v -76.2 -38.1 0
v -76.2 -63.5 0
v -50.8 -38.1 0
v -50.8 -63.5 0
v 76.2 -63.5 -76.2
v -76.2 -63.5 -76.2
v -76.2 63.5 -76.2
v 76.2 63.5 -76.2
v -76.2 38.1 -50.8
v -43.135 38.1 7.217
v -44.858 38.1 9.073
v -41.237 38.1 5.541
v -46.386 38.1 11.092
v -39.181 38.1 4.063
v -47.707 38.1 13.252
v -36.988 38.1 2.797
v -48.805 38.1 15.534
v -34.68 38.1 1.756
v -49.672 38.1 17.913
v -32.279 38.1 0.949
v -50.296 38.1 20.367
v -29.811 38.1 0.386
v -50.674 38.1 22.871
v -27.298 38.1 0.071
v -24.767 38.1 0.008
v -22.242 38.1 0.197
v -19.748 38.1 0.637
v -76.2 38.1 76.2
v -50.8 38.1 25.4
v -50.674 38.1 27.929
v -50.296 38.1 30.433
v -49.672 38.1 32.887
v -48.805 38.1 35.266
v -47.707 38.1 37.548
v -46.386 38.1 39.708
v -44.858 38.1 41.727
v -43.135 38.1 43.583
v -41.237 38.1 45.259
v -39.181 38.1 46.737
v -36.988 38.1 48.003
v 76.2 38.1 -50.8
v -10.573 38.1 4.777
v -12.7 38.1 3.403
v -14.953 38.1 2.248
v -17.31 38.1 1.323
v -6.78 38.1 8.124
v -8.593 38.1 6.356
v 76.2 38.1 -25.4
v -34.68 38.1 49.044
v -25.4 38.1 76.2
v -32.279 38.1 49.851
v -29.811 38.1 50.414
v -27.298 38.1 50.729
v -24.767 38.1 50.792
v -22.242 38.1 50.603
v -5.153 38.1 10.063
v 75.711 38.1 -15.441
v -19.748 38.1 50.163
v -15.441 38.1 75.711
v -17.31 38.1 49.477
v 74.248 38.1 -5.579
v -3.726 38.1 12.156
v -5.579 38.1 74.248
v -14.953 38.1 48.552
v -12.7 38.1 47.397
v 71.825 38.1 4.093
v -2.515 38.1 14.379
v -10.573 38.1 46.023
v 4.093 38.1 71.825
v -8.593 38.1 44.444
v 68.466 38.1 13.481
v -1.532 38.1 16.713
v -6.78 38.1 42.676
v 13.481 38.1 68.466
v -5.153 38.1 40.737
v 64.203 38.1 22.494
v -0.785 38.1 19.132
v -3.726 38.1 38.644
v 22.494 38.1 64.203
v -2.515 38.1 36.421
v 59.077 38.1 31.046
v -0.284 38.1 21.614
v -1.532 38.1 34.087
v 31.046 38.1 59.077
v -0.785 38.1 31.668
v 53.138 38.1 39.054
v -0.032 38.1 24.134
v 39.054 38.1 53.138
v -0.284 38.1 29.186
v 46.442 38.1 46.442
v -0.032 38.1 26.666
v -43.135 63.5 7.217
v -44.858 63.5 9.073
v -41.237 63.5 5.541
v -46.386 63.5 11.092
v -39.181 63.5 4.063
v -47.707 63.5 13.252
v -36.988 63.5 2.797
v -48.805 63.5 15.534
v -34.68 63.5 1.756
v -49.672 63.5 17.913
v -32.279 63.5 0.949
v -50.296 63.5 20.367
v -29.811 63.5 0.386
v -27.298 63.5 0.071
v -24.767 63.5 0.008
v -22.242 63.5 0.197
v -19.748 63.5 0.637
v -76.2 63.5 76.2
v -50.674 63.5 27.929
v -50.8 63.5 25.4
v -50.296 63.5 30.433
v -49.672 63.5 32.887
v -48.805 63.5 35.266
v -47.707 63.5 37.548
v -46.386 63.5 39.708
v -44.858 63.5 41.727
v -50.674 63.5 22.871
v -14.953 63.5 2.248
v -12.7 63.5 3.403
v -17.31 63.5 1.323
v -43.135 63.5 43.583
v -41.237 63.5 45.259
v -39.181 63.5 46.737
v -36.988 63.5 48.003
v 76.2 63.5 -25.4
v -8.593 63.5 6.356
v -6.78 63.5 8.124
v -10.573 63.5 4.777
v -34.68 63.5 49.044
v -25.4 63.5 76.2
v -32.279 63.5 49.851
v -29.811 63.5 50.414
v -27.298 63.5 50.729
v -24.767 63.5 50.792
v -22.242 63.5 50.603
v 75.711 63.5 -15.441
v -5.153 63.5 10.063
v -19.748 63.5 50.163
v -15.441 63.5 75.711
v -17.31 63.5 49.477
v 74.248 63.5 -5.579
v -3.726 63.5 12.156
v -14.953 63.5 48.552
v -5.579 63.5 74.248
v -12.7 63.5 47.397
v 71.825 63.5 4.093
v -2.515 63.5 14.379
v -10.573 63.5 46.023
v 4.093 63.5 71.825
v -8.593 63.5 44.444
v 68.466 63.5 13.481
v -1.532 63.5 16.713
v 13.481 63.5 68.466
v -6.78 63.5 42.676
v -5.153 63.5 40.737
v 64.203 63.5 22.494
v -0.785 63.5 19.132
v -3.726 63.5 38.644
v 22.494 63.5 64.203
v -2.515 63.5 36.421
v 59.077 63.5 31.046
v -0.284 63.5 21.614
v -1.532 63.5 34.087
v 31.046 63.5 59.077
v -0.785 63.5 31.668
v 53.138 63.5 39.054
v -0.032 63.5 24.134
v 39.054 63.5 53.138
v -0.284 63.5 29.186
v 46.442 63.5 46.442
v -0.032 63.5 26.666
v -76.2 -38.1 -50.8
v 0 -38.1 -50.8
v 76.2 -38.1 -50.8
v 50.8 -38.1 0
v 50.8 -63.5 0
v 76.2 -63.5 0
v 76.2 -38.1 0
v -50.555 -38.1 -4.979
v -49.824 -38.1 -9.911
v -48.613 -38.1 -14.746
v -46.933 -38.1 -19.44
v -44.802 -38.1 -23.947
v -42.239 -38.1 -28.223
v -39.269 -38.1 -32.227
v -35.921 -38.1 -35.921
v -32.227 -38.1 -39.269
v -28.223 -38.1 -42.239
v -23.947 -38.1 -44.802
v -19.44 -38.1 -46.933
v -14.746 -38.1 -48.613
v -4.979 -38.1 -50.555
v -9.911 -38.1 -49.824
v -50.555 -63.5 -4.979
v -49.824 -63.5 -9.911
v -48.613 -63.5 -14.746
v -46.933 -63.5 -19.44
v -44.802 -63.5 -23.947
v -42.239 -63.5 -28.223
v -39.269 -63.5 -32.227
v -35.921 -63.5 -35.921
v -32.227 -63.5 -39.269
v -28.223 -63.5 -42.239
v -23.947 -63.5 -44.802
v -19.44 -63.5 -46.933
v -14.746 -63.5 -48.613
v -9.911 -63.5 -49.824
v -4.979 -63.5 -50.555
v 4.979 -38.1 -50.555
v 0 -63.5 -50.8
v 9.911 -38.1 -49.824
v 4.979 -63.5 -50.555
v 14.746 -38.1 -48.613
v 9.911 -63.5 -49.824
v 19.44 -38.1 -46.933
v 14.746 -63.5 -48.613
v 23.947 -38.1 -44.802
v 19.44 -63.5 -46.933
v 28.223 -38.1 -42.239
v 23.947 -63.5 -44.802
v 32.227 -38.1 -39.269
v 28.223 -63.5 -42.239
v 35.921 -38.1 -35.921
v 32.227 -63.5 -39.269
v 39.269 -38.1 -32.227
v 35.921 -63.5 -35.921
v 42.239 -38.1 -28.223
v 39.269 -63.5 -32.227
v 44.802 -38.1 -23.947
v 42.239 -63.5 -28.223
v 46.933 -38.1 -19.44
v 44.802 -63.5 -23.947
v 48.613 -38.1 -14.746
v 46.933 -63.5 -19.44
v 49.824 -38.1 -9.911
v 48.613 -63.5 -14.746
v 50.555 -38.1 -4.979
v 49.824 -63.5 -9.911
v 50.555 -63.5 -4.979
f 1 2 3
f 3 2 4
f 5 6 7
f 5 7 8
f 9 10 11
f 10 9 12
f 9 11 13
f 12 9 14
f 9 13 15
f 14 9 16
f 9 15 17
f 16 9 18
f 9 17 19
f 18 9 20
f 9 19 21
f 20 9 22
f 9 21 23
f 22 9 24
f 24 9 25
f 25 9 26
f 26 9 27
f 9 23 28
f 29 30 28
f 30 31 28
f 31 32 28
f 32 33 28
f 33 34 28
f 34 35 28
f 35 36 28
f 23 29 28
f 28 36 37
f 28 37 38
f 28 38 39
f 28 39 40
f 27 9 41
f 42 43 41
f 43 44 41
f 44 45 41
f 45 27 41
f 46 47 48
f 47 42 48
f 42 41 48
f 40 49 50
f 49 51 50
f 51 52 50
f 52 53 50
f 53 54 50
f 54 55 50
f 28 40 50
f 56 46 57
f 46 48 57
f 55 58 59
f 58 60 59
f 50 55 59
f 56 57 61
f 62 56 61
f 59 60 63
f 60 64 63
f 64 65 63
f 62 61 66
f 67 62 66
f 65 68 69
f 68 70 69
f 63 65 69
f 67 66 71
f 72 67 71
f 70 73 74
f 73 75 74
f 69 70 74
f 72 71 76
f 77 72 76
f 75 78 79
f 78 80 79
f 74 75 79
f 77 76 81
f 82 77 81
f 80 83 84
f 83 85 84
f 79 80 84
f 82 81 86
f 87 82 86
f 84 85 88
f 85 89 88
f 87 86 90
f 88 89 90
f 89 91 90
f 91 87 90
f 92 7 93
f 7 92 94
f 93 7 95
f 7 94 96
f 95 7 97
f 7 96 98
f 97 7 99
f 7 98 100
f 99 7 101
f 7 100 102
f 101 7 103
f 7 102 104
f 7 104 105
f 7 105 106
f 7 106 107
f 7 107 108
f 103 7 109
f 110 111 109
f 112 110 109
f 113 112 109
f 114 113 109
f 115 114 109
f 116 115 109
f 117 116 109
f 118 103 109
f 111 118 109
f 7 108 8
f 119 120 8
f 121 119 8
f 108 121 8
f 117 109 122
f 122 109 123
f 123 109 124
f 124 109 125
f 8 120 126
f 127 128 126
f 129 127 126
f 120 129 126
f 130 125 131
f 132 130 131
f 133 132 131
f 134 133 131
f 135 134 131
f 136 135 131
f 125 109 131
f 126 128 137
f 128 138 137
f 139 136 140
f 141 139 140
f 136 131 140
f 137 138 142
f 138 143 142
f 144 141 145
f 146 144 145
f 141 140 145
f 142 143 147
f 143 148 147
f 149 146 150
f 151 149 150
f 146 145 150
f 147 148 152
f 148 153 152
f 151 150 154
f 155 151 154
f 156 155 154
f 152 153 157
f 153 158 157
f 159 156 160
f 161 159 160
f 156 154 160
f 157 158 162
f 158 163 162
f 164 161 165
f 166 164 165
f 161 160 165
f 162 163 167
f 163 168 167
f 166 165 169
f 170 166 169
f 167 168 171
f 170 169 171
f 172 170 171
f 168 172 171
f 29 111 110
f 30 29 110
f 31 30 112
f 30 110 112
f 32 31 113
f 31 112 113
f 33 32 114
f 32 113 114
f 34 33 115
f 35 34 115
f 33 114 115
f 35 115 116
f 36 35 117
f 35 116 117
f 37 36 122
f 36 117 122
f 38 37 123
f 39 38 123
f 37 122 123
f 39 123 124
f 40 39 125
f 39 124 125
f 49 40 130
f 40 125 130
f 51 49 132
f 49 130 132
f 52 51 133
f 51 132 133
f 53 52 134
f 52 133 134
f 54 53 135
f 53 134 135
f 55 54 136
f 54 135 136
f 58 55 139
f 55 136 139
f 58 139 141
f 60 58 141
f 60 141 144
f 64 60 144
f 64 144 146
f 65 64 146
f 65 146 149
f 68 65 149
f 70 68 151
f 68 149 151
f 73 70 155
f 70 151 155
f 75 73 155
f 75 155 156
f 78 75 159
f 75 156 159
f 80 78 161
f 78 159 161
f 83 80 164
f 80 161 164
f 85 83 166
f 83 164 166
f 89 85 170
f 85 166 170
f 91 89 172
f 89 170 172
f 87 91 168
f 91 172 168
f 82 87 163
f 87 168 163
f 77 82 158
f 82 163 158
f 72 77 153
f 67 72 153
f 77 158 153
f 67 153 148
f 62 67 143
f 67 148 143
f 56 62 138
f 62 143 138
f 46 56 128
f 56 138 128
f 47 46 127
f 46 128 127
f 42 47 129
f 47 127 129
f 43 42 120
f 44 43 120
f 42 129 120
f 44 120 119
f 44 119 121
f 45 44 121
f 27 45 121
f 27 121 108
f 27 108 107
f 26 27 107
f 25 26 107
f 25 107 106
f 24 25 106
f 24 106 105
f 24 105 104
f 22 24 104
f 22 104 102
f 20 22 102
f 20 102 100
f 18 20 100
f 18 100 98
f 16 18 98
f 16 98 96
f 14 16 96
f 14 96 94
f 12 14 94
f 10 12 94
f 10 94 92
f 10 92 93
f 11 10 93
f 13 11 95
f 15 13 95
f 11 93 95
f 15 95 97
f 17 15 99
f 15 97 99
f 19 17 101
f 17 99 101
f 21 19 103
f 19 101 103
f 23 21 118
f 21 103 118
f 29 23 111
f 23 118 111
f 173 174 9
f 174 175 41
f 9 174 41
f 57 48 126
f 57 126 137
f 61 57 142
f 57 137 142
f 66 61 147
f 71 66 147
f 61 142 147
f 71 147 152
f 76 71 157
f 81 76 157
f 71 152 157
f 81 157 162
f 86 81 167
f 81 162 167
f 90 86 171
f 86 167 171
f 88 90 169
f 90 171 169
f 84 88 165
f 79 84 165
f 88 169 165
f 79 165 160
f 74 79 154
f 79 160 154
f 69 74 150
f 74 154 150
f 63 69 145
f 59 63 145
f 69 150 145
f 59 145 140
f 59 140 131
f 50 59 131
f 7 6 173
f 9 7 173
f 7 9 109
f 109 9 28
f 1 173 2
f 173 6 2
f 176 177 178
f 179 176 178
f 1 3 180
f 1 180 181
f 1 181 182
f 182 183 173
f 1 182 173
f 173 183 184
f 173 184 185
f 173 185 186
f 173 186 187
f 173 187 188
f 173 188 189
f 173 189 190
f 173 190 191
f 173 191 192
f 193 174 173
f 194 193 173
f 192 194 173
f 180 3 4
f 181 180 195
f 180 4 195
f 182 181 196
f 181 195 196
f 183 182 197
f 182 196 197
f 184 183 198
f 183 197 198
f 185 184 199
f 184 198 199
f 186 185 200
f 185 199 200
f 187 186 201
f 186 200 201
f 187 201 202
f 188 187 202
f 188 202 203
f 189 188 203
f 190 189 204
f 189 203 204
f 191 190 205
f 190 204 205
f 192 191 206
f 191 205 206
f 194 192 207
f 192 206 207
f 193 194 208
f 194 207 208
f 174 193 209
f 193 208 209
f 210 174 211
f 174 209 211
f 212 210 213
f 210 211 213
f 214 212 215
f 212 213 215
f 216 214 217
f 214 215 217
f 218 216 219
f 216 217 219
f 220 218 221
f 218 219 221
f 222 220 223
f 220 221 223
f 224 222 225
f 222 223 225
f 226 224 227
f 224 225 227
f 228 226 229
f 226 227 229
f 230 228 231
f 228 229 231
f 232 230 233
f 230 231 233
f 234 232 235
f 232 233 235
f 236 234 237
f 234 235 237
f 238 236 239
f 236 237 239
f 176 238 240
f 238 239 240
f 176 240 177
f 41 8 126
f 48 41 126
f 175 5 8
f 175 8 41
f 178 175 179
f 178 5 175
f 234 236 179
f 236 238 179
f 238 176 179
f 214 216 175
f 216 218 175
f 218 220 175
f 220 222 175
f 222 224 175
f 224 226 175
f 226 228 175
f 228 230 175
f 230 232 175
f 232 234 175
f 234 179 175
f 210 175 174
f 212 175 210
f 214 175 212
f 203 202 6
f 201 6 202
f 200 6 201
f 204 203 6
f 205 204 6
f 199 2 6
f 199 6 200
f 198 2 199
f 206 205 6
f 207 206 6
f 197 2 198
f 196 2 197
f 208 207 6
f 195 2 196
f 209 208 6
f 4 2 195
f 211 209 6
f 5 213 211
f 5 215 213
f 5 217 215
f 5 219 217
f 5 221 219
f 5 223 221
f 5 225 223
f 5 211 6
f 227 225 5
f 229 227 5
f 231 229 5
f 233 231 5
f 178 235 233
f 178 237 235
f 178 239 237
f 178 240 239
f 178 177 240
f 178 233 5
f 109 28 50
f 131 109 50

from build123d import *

# Parameters (mm, degrees)
F0_W     = 152.4
F0_H     = 152.4
F1_DEPTH = 63.5
F3_DEPTH = 152.401
F5_DEPTH = 25.4
F6_R     = 25.4
F7_DEPTH = 25.4


with BuildPart() as f1:
    # F0 (on Front) → F1 (new body, symmetric)
    with BuildSketch(Plane.XZ):
        Rectangle(F0_W, F0_H)
    extrude(amount=F1_DEPTH, both=True)

    # F2 (on face) → F3 (cut, through all)
    with BuildSketch(Plane.YZ.offset(76.2)):
        Polygon((38.1, 76.2), (-38.1, 76.2), (-38.1, -50.8), (0, -50.8), (38.1, -50.8), align=None)
    extrude(amount=-F3_DEPTH, mode=Mode.SUBTRACT)

    # F4 (on face) → F5 (cut, through all)
    with BuildSketch(Plane.XZ.offset(63.5)):
        with BuildLine():
            Line((76.2, 0), (76.2, 76.2))
            Line((76.2, 76.2), (-76.2, 76.2))
            Line((-76.2, 76.2), (-76.2, 0))
            Line((-76.2, 0), (-50.8, 0))
            ThreePointArc((-50.8, 0), (0, 50.8), (50.8, 0))
            Line((50.8, 0), (76.2, 0))
        make_face()
        with BuildLine():
            Line((-50.8, 0), (50.8, 0))
            ThreePointArc((50.8, 0), (0, 50.8), (-50.8, 0))
        make_face()
        with BuildLine():
            ThreePointArc((-50.8, 0), (0, -50.8), (50.8, 0))
            Line((50.8, 0), (-50.8, 0))
        make_face()
    extrude(amount=-F5_DEPTH, mode=Mode.SUBTRACT)

    # F6 (on face) → F7 (cut, through all)
    with BuildSketch(Plane(origin=(0, 63.5, 0), x_dir=(-1, 0, 0), z_dir=(0, 1, 0))):
        with BuildLine():
            Line((25.3999998624, 76.2), (-76.2, 76.2))
            Line((-76.2, 76.2), (-76.2, -25.4))
            ThreePointArc((-76.2, -25.4), (-46.4420490172, 46.4420489199), (25.3999998624, 76.2))
        make_face()
        with Locations((25.4, 25.4)):
            Circle(F6_R)
    extrude(amount=-F7_DEPTH, mode=Mode.SUBTRACT)


solid = f1.part
